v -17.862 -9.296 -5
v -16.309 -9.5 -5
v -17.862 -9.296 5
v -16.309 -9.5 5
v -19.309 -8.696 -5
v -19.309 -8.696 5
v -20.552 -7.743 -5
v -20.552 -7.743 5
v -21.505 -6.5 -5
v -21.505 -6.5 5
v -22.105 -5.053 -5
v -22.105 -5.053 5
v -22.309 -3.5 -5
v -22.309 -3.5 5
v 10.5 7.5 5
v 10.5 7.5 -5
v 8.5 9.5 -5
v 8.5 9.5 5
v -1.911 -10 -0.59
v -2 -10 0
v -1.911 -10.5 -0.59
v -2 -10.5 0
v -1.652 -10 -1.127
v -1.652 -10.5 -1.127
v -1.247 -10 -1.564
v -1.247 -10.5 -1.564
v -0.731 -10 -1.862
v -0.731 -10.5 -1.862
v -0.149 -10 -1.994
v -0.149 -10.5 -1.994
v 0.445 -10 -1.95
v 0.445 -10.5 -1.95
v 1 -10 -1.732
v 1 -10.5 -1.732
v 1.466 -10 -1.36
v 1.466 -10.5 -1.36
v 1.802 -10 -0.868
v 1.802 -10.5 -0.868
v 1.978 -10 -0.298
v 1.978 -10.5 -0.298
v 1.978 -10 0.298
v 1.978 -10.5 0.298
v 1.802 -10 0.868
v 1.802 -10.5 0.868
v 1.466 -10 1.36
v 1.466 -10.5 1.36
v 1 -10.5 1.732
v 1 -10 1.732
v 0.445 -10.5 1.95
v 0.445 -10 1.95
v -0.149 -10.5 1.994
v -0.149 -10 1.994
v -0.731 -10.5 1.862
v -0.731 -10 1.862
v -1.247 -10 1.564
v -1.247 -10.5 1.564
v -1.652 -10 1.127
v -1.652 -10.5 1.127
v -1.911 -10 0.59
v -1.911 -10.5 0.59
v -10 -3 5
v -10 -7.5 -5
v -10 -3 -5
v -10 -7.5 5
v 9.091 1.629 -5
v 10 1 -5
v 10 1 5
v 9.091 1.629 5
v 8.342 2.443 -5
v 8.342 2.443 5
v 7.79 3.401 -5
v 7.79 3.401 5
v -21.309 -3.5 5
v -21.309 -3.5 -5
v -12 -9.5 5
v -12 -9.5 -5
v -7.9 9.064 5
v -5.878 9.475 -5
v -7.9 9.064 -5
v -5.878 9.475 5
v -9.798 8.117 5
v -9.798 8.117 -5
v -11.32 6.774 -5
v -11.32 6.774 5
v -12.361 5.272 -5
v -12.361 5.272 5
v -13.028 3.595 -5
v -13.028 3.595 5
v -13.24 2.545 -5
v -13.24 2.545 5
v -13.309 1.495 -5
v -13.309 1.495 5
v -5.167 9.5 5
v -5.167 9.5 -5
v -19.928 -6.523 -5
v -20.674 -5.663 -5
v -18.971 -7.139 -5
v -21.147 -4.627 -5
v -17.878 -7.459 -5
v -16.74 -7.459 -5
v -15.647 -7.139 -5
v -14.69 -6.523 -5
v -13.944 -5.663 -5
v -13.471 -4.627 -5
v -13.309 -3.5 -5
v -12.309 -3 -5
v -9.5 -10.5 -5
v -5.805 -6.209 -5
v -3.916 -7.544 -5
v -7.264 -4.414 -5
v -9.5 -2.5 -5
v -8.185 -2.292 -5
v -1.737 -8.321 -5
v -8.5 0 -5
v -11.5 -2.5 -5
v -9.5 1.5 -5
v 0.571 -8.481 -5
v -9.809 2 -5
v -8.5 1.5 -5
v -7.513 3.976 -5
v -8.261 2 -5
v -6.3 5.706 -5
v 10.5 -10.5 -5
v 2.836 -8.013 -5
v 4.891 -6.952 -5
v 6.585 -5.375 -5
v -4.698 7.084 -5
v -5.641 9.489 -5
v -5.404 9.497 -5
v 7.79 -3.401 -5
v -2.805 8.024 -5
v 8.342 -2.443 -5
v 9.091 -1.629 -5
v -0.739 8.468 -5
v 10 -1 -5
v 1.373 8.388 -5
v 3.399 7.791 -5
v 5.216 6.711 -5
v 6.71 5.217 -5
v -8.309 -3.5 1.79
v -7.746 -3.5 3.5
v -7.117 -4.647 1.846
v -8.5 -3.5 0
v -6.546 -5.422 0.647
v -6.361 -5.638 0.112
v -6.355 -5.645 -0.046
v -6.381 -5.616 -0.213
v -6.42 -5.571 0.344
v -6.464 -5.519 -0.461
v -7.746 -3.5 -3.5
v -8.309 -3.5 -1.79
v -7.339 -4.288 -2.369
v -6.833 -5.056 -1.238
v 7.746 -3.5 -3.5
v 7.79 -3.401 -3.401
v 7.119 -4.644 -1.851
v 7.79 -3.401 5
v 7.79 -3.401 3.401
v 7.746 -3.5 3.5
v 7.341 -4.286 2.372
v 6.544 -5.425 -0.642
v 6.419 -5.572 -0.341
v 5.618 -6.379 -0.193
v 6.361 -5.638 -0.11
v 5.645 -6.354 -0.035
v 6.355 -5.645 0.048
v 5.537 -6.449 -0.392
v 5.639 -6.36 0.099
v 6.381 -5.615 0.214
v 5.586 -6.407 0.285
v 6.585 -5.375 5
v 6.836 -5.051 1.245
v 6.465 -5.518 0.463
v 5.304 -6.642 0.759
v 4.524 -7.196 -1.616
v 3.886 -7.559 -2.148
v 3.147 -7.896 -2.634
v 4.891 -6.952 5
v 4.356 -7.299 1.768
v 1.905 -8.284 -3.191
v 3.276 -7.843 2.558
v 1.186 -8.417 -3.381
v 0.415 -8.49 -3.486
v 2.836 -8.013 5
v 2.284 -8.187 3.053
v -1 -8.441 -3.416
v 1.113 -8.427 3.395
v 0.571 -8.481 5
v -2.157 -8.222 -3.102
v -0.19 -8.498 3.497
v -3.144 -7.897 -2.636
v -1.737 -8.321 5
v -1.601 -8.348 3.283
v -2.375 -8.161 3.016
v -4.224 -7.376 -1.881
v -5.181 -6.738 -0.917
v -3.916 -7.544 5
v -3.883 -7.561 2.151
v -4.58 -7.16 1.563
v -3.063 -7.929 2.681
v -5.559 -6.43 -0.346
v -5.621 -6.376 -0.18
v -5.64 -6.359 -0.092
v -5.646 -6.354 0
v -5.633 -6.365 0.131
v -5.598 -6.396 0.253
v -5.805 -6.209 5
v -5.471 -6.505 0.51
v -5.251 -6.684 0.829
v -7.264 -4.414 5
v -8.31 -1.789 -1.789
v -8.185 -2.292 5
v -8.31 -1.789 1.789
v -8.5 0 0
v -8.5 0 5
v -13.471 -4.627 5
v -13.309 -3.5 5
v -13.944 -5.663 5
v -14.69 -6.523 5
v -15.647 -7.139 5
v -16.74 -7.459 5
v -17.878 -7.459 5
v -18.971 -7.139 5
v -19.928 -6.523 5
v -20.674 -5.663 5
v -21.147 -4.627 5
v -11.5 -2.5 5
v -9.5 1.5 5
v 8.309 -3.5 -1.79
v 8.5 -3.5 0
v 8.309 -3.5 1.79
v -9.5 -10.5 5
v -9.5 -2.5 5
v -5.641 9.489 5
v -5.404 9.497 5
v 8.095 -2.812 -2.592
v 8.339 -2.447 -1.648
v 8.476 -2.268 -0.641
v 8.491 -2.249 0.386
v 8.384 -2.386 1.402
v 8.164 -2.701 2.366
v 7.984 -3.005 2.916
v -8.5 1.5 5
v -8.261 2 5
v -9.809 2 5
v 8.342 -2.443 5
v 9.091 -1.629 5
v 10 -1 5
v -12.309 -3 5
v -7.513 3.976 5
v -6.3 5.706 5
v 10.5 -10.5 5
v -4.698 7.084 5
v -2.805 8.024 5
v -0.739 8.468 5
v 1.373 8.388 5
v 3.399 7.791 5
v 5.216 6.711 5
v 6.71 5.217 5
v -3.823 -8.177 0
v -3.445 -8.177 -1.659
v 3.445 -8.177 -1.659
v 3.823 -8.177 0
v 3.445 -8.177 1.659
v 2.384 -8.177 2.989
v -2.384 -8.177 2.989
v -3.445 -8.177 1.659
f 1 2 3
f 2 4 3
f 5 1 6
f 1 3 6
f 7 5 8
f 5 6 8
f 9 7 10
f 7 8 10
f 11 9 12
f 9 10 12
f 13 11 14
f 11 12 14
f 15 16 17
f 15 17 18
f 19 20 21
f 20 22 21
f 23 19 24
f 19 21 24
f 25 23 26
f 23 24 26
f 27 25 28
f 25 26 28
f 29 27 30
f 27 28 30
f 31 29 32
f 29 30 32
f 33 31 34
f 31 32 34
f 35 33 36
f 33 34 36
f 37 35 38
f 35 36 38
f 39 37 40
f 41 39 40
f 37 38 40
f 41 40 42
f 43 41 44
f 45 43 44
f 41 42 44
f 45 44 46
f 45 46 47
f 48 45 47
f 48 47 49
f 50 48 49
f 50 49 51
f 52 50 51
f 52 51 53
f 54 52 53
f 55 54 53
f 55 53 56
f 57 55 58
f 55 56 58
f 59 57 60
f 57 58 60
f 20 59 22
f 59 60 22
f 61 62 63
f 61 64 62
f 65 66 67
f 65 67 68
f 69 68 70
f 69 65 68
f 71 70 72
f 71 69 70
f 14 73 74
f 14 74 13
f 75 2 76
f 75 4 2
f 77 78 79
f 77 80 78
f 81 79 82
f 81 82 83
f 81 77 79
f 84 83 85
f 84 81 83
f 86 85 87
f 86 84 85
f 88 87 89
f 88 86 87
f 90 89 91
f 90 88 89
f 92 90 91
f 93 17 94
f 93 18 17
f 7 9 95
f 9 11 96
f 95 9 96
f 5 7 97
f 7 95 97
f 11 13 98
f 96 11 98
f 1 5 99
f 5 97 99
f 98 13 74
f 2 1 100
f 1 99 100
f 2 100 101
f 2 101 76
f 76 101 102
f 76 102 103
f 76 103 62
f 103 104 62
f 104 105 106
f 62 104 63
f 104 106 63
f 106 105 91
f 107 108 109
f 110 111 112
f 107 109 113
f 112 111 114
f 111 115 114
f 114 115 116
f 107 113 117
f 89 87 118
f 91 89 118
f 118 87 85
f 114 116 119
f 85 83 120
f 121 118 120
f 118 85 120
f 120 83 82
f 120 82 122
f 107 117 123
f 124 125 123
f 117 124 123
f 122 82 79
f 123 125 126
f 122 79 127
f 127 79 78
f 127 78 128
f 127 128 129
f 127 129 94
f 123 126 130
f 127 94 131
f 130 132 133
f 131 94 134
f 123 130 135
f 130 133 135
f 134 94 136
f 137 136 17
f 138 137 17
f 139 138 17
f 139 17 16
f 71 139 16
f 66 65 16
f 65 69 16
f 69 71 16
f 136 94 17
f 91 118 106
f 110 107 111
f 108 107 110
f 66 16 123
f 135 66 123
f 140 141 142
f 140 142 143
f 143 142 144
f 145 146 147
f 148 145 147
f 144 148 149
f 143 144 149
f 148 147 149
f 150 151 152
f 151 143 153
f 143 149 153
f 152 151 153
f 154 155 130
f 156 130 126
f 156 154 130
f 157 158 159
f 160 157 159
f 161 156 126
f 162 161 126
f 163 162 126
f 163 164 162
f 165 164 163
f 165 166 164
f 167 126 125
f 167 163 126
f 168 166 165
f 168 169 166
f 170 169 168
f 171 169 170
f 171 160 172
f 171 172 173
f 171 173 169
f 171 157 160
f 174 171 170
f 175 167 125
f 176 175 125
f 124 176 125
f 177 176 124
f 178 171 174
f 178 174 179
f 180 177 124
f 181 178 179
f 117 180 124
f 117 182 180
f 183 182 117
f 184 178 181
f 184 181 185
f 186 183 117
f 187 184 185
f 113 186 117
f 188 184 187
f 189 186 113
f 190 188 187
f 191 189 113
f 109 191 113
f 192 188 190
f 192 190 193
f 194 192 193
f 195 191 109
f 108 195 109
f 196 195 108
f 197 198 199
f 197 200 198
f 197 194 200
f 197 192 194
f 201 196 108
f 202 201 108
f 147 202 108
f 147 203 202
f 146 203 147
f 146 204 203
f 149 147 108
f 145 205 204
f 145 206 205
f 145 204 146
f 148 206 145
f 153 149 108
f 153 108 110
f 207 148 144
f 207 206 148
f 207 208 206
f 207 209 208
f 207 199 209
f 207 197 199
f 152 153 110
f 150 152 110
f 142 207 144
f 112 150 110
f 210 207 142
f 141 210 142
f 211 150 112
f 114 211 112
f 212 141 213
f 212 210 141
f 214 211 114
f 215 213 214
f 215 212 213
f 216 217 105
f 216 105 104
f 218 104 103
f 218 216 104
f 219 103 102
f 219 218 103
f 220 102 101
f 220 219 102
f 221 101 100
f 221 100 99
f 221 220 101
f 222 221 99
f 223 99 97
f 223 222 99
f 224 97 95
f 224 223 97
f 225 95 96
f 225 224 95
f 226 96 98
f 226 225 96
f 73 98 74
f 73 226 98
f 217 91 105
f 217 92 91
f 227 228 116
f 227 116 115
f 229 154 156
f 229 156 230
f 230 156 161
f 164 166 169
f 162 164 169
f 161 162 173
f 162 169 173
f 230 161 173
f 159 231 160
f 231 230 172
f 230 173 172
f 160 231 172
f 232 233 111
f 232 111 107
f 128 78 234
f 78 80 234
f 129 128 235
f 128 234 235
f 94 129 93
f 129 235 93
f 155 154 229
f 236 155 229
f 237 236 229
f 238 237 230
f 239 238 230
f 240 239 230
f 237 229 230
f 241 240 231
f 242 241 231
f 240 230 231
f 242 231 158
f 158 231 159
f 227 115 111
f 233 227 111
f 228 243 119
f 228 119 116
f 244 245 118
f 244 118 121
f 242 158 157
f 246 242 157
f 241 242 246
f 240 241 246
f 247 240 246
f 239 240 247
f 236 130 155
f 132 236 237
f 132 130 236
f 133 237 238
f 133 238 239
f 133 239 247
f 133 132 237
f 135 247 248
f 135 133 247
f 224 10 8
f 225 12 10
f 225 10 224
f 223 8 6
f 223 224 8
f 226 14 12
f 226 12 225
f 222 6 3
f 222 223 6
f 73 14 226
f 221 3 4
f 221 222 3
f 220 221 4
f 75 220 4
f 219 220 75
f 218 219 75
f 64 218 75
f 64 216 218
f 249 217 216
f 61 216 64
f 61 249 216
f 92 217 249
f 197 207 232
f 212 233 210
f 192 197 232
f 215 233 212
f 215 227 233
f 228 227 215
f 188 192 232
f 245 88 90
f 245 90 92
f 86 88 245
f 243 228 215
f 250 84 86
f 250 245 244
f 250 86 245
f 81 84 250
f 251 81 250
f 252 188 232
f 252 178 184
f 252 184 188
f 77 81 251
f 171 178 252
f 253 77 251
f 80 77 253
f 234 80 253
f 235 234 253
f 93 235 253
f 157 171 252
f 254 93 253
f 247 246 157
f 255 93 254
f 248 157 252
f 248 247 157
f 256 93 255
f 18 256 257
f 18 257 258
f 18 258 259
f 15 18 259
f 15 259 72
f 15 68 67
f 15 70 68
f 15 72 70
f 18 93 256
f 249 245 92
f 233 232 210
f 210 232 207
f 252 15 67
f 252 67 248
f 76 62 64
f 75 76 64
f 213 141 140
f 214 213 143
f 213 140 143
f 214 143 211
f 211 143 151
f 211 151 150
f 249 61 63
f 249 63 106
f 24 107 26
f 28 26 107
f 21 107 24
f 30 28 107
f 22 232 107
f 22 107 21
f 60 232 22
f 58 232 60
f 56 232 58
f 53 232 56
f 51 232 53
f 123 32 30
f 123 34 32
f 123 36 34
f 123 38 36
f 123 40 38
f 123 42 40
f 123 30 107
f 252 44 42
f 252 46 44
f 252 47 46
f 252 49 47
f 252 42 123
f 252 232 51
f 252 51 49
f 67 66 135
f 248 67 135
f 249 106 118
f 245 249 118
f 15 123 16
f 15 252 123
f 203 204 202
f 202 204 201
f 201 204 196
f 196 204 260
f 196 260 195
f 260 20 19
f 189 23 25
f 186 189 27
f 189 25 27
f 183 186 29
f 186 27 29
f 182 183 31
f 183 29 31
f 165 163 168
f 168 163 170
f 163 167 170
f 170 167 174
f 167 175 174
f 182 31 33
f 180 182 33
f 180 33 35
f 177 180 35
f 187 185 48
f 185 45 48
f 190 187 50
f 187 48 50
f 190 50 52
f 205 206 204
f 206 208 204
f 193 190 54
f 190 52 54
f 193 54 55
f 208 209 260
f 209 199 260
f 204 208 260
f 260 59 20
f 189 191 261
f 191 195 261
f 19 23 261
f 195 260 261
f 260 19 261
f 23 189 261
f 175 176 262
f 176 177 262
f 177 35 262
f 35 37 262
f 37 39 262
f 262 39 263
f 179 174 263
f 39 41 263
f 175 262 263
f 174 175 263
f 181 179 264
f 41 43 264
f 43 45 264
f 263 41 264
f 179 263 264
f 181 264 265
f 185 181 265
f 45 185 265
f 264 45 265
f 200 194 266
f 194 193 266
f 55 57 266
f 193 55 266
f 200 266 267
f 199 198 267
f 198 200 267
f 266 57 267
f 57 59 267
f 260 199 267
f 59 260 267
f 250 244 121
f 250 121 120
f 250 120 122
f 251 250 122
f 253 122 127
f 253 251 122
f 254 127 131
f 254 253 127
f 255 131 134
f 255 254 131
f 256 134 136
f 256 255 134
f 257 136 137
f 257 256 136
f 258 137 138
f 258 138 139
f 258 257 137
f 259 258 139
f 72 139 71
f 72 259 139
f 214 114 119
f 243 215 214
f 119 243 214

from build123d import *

# Parameters (mm, degrees)
F1_DEPTH    = 5
F4_SIZE     = 2
F5_R        = 5.99999
F6_SIZE     = 4
F7_R        = 10
F8_R        = 8
F9_T1_DEPTH = 22.4376803184
F9_T3_DEPTH = 16.4376803184
F9_T5_DEPTH = 16.4376803184
F10_SIZE    = 2


# Not quite as in the source:
# - a fillet or chamfer that OpenCascade refuses, or shapes differently, is made with other operations: its cross-section is extruded or revolved along the edge and cut away or added
# - a fillet or chamfer is up to 0.001 mm smaller than in the source, because OpenCascade refuses the exact size


with BuildPart() as f1:
    # F0 (on Top) → F1 (new body, symmetric)
    with BuildSketch(Plane.XY):
        with BuildLine():
            ThreePointArc((8.4409715081, -1), (-0.5008703332, -8.4852300446), (-8.5, 0))
            Line((-8.5, 0), (-8.5, 1.5))
            Line((-8.5, 1.5), (-9.5, 1.5))
            Line((-9.5, 1.5), (-11.5, -2.5))
            Line((-11.5, -2.5), (-9.5, -2.5))
            Line((-9.5, -2.5), (-9.5, -10.5))
            Line((-9.5, -10.5), (10.5, -10.5))
            Line((10.5, -10.5), (10.5, 9.5))
            Line((10.5, 9.5), (-13.3090169944, 9.5))
            Line((-13.3090169944, 9.5), (-13.3090169944, -3.5))
            ThreePointArc((-13.3090169944, -3.5), (-17.3090169944, -7.5), (-21.3090169944, -3.5))
            Line((-21.3090169944, -3.5), (-22.3090169944, -3.5))
            Line((-22.3090169944, -3.5), (-22.3090169944, -9.5))
            Line((-22.3090169944, -9.5), (-13.3090169944, -9.5))
            Line((-13.3090169944, -9.5), (-10, -9.5))
            Line((-10, -9.5), (-10, -3))
            Line((-10, -3), (-12.3090169944, -3))
            Line((-12.3090169944, -3), (-9.8090169944, 2))
            Line((-9.8090169944, 2), (-8.2613558209, 2))
            ThreePointArc((-8.2613558209, 2), (0.5080014259, 8.4848060998), (8.4409715081, 1))
            Line((8.4409715081, 1), (10, 1))
            Line((10, 1), (10, -1))
            Line((10, -1), (8.4409715081, -1))
        make_face()
    extrude(amount=F1_DEPTH, both=True)

    # F2 (on Top) → F3 (revolve, cut)
    with BuildSketch(Plane.XY):
        Polygon((0, 0), (-8.5, 0), (-8.5, -3.5), (-2, -10), (-2, -10.5), (0, -10.5), align=None)
    revolve(axis=Axis((0, -4.5, 0), (0, -1, 0)), mode=Mode.SUBTRACT)

    # F4
    f4_edges = [f1.edges().sort_by_distance(p)[0] for p in [
        (-10, -9.5, 0),
    ]]
    chamfer(f4_edges, length=F4_SIZE)

    # F5 (radius 6 in the source; OpenCascade refuses exactly that, so slightly less here)
    f5_edges = [f1.edges().sort_by_distance(p)[0] for p in [
        (-22.309017, -9.5, 0),
    ]]
    fillet(f5_edges, radius=F5_R)

    # F6
    f6_edges = [f1.edges().sort_by_distance(p)[0] for p in [
        (-13.309017, 9.5, 0),
    ]]
    chamfer(f6_edges, length=F6_SIZE)

    # F7
    f7_edges = [f1.edges().sort_by_distance(p)[0] for p in [
        (-9.309017, 9.5, 0),
    ]]
    fillet(f7_edges, radius=F7_R)

    # F8
    f8_edges = [f1.edges().sort_by_distance(p)[0] for p in [
        (-13.309017, 5.5, 0),
    ]]
    fillet(f8_edges, radius=F8_R)

    # F9: fillet of radius 5 on 3 edges, made by hand

    # F9_s2 → F9_t1 (cut)
    with BuildSketch(Plane.XY.offset(-11.2188401592)):
        with BuildLine():
            ThreePointArc((10, 1), (8.693634047, 2.015063424), (7.7900075738, 3.4008501878))
            Line((7.7900075738, 3.4008501878), (7.6983604259, 3.3608401856))
            ThreePointArc((7.6983604259, 3.3608401856), (8.1072760601, 2.1981980996), (8.3416659609, 0.9882352941))
            Line((8.3416659609, 0.9882352941), (8.4409715081, 0.9))
            ThreePointArc((8.4409715081, 0.9), (9.220485754, 0.9), (9.9525527006, 0.911972994))
            Line((9.9525527006, 0.911972994), (10, 1))
        make_face()
    extrude(amount=F9_T1_DEPTH, mode=Mode.SUBTRACT)

    # F9_s4 → F9_t3 (cut)
    with BuildSketch(Plane.XY.offset(-11.2188401592)):
        with BuildLine():
            ThreePointArc((7.7900075738, -3.4008501878), (8.693634047, -2.015063424), (10, -1))
            Line((10, -1), (9.9525527006, -0.911972994))
            ThreePointArc((9.9525527006, -0.911972994), (9.220485754, -0.9), (8.4409715081, -0.9))
            Line((8.4409715081, -0.9), (8.3416659609, -0.9882352941))
            ThreePointArc((8.3416659609, -0.9882352941), (8.1072760601, -2.1981980996), (7.6983604259, -3.3608401856))
            Line((7.6983604259, -3.3608401856), (7.7900075738, -3.4008501878))
        make_face()
    extrude(amount=F9_T3_DEPTH, mode=Mode.SUBTRACT)

    # F9_s6 → F9_t5 (cut)
    with BuildSketch(Plane.XY.offset(-5.2188401592)):
        with BuildLine():
            ThreePointArc((7.7900075738, -3.4008501878), (8.693634047, -2.015063424), (10, -1))
            Line((10, -1), (9.9525527006, -0.911972994))
            ThreePointArc((9.9525527006, -0.911972994), (9.220485754, -0.9), (8.4409715081, -0.9))
            Line((8.4409715081, -0.9), (8.3416659609, -0.9882352941))
            ThreePointArc((8.3416659609, -0.9882352941), (8.1072760601, -2.1981980996), (7.6983604259, -3.3608401856))
            Line((7.6983604259, -3.3608401856), (7.7900075738, -3.4008501878))
        make_face()
    extrude(amount=F9_T5_DEPTH, mode=Mode.SUBTRACT)

    # F10
    f10_edges = [f1.edges().sort_by_distance(p)[0] for p in [
        (10.5, 9.5, 0),
    ]]
    chamfer(f10_edges, length=F10_SIZE)


solid = f1.part
